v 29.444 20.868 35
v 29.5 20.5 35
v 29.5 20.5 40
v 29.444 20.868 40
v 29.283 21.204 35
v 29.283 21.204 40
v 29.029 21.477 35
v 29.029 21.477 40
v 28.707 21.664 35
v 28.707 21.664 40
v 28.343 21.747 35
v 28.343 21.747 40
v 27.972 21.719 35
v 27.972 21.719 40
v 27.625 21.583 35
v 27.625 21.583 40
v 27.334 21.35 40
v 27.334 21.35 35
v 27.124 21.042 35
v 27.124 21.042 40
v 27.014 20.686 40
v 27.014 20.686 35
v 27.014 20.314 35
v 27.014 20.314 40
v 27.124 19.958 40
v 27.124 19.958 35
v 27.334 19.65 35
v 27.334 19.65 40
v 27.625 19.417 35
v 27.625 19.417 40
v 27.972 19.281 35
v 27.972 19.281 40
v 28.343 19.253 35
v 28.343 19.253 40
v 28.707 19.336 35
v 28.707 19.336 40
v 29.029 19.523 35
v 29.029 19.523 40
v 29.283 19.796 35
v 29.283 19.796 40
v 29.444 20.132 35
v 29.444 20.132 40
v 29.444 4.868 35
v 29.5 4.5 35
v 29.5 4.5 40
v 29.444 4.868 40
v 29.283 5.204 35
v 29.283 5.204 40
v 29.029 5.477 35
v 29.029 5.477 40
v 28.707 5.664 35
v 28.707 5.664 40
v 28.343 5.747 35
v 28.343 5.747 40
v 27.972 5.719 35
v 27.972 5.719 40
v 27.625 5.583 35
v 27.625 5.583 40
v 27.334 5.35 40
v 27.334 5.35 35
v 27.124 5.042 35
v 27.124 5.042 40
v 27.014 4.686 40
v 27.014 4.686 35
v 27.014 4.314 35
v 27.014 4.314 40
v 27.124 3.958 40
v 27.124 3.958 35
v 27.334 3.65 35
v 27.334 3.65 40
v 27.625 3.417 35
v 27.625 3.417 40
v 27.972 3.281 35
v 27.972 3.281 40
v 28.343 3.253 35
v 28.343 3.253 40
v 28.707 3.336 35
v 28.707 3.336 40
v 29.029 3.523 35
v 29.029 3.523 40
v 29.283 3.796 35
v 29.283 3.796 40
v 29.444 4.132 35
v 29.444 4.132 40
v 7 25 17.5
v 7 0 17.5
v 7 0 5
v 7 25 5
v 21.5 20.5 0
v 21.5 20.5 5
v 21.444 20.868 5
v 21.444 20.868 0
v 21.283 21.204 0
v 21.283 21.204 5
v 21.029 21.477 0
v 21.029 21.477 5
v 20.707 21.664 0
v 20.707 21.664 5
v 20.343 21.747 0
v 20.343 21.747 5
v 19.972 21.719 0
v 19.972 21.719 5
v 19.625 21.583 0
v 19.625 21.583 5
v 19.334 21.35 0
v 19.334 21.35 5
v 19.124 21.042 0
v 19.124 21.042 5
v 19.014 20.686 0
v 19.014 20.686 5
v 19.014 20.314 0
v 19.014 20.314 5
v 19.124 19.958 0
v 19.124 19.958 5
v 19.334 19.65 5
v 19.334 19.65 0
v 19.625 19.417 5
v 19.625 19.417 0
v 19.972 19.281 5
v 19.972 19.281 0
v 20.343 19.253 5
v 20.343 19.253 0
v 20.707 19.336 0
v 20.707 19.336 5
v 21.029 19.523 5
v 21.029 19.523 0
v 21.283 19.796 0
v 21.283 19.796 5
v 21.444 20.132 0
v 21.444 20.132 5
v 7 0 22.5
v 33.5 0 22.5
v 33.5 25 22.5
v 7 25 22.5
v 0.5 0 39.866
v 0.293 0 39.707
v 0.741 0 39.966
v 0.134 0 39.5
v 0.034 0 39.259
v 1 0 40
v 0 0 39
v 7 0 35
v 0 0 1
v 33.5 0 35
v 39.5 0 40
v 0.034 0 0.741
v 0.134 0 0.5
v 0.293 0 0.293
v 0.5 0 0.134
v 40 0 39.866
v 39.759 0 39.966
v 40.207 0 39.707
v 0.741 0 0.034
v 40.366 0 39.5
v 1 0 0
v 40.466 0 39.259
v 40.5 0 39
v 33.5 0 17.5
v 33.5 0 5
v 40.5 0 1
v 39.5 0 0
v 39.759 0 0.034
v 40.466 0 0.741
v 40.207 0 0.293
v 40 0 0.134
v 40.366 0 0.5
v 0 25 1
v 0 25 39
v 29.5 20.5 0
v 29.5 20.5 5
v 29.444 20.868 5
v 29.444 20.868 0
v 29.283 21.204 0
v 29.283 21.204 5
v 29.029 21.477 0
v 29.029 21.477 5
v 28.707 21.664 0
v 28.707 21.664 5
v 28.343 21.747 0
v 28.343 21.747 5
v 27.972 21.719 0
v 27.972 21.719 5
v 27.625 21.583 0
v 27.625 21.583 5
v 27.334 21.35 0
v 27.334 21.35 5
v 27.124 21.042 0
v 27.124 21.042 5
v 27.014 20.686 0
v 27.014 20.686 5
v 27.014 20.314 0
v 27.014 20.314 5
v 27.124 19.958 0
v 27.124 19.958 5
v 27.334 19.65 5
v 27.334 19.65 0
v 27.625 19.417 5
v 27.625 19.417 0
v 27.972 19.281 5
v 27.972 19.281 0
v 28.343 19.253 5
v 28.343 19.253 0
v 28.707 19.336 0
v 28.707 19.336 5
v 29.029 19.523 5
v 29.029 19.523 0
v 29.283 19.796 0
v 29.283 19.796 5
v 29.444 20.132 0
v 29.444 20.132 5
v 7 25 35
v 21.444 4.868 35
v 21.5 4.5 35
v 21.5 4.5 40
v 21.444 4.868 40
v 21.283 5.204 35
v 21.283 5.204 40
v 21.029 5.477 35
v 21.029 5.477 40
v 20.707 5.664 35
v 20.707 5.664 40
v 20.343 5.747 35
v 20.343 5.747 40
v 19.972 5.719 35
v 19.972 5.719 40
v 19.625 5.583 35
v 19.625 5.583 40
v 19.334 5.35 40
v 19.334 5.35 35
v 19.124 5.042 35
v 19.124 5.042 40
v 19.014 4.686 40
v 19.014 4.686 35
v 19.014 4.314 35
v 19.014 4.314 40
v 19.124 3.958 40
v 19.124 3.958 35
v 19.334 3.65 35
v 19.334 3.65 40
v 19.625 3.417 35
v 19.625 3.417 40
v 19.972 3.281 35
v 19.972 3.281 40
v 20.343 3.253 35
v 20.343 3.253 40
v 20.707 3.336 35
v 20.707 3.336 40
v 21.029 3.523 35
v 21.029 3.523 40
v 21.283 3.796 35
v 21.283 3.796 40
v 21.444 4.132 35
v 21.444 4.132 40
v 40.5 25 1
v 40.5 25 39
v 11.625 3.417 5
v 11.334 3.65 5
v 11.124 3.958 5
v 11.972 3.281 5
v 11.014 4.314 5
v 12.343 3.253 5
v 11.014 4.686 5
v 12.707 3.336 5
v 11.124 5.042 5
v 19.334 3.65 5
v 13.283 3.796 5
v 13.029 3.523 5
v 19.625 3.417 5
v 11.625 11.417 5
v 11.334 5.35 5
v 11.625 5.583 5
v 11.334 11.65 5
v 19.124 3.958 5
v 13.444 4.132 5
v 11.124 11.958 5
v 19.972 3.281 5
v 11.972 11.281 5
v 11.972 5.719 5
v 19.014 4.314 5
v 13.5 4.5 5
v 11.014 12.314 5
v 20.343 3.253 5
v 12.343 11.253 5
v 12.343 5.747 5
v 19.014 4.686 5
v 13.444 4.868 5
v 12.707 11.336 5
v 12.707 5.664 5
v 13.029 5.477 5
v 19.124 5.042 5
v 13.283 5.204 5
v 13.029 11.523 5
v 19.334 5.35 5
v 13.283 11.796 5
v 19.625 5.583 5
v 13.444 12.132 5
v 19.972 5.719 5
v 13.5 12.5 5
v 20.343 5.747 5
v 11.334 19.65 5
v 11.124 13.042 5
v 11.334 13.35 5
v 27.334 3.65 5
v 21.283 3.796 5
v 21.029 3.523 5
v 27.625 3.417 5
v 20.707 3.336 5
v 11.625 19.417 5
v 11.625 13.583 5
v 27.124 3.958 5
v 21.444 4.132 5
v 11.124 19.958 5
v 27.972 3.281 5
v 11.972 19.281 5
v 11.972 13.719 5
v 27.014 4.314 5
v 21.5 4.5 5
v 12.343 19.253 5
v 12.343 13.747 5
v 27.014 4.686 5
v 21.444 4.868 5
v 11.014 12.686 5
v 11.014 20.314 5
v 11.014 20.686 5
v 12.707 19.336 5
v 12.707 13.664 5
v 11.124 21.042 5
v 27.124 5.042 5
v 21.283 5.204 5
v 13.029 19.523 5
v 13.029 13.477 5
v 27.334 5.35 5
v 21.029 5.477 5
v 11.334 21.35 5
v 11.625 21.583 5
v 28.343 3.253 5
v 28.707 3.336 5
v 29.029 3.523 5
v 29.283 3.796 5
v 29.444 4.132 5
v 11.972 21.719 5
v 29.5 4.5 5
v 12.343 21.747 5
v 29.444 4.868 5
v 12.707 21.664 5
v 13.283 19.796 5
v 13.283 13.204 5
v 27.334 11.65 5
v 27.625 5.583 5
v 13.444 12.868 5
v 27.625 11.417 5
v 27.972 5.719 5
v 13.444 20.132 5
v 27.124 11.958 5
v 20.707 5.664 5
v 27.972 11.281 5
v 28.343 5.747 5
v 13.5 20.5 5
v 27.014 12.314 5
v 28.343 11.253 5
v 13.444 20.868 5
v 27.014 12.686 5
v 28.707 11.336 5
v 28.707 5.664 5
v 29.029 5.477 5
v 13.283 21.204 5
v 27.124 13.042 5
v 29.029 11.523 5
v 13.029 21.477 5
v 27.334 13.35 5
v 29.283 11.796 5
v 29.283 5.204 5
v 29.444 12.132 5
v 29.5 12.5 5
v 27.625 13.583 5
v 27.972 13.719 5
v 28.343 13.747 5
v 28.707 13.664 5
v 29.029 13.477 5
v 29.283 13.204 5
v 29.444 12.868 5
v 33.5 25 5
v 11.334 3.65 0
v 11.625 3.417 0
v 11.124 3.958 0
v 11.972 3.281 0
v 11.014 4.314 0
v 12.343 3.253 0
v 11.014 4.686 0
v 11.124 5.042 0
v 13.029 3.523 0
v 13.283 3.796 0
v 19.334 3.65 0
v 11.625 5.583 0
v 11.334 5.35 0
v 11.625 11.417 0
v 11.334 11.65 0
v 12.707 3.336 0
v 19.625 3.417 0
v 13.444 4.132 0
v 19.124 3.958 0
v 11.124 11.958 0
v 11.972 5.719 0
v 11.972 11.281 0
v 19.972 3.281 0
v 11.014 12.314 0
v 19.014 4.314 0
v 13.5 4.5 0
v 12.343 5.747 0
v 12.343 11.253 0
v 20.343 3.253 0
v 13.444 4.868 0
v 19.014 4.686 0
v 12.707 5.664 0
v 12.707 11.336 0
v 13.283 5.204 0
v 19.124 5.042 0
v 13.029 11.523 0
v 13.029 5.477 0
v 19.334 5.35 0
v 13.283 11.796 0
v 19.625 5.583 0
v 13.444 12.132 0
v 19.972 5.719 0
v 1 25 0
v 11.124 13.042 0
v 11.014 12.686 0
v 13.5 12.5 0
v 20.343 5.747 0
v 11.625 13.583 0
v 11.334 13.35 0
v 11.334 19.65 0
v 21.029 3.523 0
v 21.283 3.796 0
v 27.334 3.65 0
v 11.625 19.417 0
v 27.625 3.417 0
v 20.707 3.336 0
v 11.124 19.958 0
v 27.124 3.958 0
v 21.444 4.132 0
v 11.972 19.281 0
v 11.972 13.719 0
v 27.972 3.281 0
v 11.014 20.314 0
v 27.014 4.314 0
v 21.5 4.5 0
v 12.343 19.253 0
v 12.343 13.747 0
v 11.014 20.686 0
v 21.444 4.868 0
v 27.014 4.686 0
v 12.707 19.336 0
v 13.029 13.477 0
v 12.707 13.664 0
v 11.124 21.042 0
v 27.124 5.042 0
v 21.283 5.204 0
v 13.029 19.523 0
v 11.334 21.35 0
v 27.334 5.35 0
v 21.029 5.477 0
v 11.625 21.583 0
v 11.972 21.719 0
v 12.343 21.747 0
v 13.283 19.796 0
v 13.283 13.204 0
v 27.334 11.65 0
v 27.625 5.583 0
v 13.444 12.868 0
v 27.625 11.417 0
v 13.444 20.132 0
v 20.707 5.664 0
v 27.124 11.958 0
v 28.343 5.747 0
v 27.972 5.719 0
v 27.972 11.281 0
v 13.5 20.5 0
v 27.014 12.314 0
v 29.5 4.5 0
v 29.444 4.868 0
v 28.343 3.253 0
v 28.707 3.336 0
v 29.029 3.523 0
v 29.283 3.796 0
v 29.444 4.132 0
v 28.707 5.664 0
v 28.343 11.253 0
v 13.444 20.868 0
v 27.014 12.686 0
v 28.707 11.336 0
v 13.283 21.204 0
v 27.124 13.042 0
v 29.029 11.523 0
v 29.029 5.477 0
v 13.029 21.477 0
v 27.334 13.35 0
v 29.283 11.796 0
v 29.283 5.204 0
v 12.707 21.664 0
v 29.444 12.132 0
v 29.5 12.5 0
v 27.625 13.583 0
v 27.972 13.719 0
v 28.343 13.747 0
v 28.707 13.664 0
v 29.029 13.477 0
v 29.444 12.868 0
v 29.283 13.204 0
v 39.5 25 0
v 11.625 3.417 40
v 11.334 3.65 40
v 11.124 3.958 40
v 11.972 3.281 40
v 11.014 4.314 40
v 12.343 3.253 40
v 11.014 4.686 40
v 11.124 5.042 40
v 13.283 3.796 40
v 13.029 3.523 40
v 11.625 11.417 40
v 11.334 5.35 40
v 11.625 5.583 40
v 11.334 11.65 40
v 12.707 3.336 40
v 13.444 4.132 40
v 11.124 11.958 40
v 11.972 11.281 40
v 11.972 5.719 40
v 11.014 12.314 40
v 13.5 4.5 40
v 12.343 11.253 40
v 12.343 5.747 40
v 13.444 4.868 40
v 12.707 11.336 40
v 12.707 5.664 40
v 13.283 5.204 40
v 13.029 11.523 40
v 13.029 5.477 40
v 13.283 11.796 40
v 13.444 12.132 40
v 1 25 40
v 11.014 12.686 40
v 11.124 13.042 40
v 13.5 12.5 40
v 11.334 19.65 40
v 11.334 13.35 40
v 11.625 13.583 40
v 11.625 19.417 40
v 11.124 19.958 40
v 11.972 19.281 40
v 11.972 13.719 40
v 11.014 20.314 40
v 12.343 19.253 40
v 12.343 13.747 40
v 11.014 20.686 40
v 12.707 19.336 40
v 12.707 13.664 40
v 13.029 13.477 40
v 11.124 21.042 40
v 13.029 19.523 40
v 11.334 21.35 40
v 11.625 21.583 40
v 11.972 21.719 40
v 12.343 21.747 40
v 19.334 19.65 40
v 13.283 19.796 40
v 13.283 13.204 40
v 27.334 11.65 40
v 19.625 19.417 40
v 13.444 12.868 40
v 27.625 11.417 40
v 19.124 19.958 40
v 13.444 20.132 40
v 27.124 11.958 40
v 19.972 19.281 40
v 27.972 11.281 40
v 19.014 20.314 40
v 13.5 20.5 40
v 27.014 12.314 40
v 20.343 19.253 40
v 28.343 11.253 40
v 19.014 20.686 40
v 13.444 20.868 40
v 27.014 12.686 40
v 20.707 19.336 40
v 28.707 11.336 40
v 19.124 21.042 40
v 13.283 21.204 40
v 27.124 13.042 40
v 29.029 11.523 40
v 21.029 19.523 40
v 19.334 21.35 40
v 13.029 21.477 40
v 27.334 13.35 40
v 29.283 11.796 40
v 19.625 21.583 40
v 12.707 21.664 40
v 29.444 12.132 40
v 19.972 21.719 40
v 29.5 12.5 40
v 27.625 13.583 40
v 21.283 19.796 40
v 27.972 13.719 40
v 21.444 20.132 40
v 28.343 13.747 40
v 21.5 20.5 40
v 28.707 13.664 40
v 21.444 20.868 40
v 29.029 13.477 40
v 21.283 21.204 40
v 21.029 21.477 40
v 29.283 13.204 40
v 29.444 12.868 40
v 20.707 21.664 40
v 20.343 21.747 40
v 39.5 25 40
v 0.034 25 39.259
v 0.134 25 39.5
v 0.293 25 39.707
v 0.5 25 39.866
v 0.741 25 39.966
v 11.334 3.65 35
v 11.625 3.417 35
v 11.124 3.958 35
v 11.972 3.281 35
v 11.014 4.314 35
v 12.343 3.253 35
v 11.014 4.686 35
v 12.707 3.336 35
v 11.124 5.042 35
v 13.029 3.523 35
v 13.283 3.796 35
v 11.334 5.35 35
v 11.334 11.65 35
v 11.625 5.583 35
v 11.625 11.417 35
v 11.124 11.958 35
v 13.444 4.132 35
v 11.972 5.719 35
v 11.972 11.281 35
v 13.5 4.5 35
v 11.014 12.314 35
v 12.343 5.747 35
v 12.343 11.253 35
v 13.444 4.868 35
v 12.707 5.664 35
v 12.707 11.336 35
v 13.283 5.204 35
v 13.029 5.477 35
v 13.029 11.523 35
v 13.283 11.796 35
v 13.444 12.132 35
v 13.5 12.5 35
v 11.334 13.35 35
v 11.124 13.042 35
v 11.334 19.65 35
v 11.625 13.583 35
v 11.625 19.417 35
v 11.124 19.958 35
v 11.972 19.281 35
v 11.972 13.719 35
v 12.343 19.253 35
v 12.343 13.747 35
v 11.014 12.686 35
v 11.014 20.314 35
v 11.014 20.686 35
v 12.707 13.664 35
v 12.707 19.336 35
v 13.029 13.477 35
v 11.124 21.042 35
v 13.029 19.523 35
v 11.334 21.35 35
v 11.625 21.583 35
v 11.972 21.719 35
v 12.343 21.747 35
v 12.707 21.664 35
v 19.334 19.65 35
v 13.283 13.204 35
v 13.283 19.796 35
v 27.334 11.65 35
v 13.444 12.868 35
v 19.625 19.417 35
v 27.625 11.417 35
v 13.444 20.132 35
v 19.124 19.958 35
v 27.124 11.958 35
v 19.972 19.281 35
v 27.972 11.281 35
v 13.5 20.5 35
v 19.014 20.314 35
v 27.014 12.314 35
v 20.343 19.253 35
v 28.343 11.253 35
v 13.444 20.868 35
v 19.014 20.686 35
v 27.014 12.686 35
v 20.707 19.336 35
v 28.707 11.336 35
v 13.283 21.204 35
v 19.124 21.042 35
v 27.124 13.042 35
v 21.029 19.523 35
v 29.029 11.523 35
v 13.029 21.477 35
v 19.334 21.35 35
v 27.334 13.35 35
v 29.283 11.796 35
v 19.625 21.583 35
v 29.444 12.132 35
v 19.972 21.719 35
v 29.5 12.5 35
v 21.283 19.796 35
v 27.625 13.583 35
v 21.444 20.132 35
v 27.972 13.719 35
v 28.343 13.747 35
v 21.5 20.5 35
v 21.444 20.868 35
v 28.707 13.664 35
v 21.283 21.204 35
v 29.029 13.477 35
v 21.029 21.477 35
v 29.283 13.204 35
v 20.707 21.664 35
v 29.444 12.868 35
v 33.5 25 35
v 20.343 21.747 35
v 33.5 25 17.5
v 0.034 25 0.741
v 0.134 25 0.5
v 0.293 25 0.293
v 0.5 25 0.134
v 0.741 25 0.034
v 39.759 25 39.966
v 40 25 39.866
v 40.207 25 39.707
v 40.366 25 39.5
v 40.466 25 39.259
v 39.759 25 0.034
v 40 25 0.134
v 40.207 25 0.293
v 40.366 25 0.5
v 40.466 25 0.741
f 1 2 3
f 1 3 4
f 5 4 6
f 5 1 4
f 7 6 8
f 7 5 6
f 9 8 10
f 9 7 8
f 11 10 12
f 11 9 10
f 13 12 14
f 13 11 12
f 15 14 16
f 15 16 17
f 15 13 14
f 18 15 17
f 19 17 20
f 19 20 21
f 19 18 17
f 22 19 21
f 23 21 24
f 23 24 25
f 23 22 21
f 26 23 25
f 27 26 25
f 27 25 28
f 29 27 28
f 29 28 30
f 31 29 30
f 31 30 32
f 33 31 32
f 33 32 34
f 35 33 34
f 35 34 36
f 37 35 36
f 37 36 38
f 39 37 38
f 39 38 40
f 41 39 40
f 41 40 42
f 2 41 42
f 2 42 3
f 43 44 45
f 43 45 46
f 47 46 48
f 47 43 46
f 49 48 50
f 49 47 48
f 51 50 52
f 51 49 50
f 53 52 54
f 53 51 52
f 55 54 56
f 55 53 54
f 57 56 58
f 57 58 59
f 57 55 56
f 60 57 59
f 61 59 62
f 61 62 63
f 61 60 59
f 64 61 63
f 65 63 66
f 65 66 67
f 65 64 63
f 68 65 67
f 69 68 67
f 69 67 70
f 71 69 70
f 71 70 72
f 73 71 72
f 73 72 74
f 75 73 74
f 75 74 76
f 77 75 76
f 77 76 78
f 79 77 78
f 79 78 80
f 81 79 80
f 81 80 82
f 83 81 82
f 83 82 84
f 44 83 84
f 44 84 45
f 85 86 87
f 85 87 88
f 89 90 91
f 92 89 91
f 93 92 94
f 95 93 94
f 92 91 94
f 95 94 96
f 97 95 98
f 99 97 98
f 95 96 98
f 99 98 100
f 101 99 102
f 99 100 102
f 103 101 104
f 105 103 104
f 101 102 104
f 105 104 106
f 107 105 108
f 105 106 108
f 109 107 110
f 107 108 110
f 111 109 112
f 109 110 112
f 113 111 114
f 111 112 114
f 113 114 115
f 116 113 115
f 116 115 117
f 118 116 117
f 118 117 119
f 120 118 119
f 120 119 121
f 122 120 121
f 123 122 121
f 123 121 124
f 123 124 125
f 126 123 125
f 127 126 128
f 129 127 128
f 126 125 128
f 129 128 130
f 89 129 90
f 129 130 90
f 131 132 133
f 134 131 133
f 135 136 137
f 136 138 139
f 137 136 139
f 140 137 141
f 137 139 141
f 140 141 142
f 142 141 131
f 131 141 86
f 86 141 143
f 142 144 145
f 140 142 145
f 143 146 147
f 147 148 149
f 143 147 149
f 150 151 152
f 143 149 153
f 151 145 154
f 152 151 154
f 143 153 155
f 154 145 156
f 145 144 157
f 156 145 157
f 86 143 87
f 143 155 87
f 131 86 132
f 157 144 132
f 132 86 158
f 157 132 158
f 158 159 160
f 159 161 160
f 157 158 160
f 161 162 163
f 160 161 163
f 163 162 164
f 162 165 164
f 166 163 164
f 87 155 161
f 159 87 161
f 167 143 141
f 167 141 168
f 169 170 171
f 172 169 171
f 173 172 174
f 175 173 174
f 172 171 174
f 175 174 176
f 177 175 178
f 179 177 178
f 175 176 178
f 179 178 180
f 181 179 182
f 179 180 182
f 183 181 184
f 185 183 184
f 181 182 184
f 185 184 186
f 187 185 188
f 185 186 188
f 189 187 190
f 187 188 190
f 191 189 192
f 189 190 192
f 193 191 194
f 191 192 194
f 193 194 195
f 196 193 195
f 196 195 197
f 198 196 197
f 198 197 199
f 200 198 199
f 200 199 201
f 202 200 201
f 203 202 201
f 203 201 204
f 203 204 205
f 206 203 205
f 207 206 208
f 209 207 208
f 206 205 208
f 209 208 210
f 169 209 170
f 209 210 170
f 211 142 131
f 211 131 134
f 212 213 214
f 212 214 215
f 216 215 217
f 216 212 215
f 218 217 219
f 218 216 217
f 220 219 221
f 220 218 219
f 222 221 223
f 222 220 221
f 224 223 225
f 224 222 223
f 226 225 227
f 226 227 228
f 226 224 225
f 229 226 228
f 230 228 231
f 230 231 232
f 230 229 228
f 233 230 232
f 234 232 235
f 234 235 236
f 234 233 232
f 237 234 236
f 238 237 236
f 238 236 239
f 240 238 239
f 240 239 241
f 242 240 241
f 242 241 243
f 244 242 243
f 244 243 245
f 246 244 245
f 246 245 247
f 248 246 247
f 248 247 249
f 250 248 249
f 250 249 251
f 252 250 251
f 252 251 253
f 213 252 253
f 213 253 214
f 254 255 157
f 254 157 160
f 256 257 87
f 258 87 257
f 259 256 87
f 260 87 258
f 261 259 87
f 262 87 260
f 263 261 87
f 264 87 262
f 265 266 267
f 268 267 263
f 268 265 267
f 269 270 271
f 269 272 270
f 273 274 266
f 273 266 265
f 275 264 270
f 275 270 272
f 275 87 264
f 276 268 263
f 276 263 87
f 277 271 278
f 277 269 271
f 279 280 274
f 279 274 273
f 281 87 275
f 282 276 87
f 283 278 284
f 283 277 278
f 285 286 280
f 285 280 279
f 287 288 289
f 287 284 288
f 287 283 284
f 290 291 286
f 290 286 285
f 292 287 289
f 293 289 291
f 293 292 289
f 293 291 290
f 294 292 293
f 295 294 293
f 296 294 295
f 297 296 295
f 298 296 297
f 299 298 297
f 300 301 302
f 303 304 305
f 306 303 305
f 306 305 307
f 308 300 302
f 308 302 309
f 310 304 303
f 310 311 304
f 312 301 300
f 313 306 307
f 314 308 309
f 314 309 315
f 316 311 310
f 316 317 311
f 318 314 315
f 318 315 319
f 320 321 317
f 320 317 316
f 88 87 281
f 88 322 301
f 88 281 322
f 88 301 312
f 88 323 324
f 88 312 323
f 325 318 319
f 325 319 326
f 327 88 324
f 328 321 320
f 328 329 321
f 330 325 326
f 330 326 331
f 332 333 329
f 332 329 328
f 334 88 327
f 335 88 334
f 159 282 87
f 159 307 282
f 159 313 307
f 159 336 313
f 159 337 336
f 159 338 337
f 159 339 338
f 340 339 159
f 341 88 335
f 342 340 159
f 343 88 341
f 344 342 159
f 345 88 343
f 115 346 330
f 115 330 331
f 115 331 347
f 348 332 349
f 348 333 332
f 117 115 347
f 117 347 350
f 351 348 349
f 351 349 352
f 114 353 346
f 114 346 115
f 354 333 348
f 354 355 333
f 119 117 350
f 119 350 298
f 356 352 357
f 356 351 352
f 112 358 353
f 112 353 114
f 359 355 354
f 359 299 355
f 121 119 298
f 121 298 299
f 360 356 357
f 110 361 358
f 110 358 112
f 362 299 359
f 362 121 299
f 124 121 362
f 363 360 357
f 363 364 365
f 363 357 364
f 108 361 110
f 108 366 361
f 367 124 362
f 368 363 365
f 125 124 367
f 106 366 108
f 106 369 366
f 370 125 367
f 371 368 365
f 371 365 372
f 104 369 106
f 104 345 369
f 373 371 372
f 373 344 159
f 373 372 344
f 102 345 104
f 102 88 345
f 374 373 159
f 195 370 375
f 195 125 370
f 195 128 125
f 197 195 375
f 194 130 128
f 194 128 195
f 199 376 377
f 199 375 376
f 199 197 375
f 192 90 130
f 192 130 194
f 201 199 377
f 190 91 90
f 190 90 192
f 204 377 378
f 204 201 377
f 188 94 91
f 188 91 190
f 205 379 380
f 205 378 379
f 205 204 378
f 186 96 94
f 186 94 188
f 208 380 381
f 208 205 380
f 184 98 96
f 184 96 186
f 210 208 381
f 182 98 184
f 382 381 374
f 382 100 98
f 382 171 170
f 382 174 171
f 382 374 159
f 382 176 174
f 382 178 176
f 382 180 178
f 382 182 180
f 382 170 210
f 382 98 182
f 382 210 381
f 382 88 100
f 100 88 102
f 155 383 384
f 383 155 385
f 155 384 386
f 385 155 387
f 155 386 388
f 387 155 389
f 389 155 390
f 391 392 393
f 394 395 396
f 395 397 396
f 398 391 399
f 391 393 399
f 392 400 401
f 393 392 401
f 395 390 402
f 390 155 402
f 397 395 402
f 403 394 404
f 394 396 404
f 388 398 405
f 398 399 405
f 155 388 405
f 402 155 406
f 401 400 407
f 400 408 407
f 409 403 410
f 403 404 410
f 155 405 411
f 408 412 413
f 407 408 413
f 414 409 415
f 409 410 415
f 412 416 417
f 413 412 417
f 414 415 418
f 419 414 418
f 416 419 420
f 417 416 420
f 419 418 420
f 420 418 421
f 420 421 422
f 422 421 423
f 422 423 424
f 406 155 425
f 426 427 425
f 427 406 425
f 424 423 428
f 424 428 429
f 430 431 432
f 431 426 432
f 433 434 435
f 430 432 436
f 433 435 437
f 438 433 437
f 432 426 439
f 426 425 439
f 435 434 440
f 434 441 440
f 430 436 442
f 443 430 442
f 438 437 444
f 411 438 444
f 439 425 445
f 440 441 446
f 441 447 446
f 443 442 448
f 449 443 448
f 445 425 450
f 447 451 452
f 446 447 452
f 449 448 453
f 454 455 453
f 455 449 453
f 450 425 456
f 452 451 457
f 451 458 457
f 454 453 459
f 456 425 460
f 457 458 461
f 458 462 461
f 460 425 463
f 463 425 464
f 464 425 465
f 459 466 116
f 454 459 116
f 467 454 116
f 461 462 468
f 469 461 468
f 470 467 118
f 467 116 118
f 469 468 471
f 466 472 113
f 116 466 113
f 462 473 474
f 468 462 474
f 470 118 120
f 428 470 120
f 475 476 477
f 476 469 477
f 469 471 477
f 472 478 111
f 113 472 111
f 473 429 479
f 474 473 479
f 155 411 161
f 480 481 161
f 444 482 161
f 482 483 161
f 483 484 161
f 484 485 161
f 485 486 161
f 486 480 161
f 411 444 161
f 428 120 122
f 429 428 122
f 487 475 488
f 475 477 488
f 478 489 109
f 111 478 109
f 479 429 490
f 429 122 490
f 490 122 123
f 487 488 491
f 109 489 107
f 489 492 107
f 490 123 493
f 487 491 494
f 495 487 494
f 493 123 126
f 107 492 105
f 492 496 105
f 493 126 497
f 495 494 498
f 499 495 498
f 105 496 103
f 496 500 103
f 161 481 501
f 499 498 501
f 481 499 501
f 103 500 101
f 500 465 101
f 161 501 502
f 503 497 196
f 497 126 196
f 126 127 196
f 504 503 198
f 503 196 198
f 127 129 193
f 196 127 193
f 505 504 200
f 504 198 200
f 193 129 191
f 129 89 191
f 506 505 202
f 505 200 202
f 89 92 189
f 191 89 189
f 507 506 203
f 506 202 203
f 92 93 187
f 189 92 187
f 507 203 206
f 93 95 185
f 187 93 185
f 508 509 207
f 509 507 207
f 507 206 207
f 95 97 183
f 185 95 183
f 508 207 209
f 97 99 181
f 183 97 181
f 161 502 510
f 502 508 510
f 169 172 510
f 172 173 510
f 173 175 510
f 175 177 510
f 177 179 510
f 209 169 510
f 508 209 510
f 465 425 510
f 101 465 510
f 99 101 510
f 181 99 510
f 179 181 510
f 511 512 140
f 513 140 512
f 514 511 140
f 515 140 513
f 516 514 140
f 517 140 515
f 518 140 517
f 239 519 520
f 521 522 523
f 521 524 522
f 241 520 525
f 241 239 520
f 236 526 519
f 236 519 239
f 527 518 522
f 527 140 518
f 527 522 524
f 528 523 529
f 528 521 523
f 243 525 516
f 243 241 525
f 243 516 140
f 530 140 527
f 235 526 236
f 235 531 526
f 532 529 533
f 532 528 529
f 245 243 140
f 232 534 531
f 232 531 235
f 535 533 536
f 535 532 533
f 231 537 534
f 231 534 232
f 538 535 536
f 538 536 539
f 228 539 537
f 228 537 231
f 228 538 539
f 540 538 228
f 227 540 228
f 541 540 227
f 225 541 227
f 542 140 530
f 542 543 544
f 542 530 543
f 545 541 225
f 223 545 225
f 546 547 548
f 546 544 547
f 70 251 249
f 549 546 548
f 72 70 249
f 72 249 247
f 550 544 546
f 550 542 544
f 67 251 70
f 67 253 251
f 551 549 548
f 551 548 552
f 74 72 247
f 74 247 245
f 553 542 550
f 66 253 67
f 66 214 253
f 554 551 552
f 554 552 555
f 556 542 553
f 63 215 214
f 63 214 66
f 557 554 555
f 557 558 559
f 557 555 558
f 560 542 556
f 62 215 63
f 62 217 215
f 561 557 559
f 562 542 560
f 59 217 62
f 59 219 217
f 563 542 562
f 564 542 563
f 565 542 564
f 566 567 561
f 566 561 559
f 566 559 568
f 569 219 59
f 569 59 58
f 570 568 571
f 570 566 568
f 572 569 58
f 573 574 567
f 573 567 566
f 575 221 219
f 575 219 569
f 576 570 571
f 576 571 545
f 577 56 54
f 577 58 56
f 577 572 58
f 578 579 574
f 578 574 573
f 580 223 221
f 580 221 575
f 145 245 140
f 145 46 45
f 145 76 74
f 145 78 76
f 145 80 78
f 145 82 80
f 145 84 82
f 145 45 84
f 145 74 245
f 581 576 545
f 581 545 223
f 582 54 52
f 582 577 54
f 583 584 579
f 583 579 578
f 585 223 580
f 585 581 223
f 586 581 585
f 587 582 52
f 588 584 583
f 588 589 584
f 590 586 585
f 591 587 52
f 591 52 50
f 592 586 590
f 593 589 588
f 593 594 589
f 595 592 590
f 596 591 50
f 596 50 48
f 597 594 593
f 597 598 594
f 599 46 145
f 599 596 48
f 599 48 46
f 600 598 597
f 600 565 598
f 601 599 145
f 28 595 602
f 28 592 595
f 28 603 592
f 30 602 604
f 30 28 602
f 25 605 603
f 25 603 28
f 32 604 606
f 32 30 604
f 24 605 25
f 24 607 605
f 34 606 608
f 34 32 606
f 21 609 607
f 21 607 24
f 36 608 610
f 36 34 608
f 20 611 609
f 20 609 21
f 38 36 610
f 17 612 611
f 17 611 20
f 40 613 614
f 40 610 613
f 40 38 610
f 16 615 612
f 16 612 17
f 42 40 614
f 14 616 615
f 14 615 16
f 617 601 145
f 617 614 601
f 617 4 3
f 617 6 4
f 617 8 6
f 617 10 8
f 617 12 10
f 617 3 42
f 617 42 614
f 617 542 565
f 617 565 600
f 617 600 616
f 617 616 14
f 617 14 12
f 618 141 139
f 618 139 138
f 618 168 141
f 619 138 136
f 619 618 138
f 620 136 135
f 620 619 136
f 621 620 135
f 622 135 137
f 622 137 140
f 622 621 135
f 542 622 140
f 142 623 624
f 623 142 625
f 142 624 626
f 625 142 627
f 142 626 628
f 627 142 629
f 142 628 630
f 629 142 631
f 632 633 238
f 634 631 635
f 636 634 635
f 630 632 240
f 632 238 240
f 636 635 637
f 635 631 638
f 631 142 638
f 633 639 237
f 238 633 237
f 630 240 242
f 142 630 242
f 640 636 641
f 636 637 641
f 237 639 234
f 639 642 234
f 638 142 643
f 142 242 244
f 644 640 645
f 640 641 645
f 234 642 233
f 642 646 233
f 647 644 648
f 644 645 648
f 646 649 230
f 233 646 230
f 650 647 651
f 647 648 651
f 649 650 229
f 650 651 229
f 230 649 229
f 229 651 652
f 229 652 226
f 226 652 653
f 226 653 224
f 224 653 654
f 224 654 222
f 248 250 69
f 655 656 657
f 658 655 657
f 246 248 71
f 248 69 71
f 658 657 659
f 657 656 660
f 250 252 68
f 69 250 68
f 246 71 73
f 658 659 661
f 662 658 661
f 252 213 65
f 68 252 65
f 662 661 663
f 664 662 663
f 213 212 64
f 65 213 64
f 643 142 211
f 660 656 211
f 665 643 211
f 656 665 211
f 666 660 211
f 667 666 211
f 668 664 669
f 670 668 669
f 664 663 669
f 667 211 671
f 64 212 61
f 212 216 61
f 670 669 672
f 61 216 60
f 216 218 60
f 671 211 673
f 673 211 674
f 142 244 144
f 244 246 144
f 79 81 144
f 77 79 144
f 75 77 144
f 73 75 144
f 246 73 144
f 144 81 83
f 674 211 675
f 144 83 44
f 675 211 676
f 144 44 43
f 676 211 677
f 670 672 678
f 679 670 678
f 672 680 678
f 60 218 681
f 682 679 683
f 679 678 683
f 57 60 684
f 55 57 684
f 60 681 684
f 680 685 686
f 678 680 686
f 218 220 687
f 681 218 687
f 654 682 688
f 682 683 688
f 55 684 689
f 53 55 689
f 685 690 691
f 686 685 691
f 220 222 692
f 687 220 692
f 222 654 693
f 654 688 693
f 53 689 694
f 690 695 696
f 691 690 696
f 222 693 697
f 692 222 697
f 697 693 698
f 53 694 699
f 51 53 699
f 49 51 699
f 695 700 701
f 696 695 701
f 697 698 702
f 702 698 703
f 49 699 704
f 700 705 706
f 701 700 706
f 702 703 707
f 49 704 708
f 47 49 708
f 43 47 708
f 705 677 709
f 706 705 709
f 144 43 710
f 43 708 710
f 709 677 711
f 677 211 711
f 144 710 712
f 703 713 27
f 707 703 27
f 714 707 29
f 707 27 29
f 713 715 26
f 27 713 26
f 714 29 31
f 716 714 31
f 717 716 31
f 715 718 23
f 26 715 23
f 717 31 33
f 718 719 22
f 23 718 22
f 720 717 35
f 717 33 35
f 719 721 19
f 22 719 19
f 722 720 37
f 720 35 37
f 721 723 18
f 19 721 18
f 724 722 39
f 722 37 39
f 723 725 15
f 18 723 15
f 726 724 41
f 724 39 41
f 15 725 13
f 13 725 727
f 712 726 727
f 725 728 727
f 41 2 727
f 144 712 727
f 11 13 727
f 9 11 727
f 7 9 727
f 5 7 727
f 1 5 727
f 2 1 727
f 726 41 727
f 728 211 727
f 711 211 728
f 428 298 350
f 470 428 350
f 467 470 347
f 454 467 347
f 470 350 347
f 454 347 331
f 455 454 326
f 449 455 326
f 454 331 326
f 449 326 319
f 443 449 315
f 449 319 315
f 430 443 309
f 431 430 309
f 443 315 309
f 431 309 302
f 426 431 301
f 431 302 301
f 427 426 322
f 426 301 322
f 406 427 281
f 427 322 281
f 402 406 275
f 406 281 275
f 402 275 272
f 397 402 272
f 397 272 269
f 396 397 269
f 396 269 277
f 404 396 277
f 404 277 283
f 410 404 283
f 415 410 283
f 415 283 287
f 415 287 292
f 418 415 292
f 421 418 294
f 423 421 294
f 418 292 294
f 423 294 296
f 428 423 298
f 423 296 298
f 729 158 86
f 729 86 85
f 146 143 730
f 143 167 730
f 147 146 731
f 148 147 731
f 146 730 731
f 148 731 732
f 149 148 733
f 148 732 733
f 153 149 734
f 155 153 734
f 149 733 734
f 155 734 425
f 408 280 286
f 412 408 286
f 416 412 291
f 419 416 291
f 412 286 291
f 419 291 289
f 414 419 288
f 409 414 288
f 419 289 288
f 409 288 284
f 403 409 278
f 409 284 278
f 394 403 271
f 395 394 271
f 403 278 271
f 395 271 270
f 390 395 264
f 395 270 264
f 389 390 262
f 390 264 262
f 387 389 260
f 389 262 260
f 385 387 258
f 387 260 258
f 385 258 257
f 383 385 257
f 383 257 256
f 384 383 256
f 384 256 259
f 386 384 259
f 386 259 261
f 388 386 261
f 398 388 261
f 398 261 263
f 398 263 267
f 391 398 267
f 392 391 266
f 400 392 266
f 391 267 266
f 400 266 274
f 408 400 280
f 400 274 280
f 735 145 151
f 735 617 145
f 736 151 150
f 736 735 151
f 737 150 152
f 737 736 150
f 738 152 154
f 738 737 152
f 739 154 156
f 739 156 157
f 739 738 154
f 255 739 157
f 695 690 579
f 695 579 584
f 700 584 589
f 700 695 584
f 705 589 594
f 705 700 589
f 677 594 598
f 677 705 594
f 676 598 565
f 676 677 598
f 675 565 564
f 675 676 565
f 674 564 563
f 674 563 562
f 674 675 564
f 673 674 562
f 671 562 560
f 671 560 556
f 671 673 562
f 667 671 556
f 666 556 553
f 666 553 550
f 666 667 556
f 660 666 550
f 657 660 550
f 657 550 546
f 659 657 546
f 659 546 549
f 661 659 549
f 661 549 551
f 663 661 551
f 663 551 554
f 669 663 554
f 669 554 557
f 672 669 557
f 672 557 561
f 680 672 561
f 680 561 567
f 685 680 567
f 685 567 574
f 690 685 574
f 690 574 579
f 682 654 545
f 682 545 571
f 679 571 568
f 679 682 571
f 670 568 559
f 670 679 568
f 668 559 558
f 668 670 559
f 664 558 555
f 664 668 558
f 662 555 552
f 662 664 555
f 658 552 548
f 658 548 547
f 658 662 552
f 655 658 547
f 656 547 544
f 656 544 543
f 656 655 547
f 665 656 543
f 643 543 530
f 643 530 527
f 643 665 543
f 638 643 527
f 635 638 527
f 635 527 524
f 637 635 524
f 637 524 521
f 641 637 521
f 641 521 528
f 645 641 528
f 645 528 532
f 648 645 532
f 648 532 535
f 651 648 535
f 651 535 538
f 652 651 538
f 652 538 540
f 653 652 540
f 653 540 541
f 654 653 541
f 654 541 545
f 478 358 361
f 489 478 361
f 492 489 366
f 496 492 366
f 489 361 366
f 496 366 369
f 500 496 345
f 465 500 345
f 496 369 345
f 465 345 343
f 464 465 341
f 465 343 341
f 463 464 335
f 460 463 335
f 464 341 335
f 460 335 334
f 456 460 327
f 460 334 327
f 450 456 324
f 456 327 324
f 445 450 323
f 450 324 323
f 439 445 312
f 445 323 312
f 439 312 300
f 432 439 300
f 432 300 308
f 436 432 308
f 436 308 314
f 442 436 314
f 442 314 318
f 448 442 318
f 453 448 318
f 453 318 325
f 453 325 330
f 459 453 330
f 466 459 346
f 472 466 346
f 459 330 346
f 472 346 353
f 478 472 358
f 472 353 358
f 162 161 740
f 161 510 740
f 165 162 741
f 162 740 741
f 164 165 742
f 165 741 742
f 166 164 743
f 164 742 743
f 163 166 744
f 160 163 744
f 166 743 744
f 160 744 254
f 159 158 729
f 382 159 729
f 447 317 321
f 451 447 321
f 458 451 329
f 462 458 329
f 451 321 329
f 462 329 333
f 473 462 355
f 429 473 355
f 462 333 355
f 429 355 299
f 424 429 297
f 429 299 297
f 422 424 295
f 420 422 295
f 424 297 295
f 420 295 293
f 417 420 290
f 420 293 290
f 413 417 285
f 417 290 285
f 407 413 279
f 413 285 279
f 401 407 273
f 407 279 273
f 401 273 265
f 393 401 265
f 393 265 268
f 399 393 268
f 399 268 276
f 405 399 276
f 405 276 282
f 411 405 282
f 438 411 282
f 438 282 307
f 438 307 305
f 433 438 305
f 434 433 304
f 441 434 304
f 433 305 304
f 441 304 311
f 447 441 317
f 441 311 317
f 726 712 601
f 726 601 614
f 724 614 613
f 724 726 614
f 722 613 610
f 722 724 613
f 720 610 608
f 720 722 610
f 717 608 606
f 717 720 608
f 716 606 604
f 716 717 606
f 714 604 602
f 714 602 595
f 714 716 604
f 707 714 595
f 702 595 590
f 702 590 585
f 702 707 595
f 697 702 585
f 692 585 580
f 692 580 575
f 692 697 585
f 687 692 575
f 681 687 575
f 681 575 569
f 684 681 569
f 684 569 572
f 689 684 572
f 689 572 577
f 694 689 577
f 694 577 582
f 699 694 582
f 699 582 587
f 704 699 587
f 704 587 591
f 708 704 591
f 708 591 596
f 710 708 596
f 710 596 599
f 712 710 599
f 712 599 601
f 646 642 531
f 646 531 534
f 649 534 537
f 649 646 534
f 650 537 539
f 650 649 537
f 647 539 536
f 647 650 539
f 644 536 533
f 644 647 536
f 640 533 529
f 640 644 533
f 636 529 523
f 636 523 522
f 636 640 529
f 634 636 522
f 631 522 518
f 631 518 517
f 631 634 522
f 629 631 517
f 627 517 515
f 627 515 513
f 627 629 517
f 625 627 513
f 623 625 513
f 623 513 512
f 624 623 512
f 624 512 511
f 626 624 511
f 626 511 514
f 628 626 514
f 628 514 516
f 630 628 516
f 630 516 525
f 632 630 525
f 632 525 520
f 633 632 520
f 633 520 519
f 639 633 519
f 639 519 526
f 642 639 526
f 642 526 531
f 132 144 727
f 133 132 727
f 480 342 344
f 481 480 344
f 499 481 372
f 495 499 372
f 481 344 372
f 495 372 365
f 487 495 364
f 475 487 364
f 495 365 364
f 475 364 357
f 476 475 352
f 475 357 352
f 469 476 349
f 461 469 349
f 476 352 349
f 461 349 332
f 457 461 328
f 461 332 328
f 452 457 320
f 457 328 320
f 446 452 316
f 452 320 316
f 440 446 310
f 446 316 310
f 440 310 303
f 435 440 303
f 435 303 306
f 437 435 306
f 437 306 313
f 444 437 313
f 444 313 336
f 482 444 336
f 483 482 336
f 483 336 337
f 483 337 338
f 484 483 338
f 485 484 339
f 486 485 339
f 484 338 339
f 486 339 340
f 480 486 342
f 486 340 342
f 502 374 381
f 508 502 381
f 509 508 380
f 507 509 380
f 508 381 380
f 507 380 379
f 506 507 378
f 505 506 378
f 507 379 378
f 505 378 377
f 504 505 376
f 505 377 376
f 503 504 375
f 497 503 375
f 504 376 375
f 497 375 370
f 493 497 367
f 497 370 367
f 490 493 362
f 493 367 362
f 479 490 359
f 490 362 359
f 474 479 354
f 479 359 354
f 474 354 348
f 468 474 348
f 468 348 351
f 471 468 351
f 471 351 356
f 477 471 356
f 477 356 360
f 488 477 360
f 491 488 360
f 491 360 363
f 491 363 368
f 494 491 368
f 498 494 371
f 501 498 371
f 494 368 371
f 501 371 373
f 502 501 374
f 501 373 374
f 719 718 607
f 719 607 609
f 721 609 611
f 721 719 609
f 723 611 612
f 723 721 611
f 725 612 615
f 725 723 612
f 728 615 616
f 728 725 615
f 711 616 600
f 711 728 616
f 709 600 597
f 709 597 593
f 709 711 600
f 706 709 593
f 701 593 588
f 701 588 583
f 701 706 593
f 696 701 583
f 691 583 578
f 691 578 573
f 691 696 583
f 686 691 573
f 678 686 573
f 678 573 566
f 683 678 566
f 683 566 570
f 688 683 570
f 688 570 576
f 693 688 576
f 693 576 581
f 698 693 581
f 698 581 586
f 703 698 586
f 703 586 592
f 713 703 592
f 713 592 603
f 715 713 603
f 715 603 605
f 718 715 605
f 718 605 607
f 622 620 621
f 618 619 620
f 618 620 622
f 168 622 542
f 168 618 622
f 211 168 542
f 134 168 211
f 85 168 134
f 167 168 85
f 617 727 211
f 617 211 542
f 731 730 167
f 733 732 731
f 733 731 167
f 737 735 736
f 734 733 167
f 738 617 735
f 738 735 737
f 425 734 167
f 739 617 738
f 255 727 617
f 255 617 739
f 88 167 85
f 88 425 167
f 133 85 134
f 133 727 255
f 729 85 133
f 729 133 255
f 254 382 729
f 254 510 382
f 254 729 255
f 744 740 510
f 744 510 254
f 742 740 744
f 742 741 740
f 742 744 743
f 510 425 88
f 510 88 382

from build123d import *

# Parameters (mm, degrees)
SKETCH1_W               = 40.5
SKETCH1_H               = 25
BOSS_EXTRUDE1_DEPTH     = 40
CUT_EXTRUDE1_START      = -5
SKETCH2_W               = 26.5
SKETCH2_H               = 25
CUT_EXTRUDE1_DEPTH      = 30
FILLET1_R               = 1
SKETCH3_R               = 1.25
CUT_EXTRUDE2_DEPTH      = 35
CUT_EXTRUDE2_DEPTH_BACK = 5
FILLET2_R               = 1
SKETCH6_W               = 5
SKETCH6_H               = 25
BOSS_EXTRUDE3_DEPTH     = 40.5


with BuildPart() as part:
    # Sketch1 → Boss-Extrude1 (new body)
    with BuildSketch(Plane.XY):
        with Locations((20.25, 12.5)):
            Rectangle(SKETCH1_W, SKETCH1_H)
    extrude(amount=BOSS_EXTRUDE1_DEPTH)

    # Sketch2 → Cut-Extrude1 (cut)
    with BuildSketch(Plane.XY.offset(40).offset(CUT_EXTRUDE1_START)):
        with Locations((20.25, 12.5)):
            Rectangle(SKETCH2_W, SKETCH2_H)
    extrude(amount=-CUT_EXTRUDE1_DEPTH, mode=Mode.SUBTRACT)

    # Fillet1
    fillet1_edges = [part.edges().sort_by_distance(p)[0] for p in [
        (40.5, 12.5, 0),
        (0, 12.5, 0),
    ]]
    fillet(fillet1_edges, radius=FILLET1_R)

    # Sketch3 → Cut-Extrude2 (cut, two sides)
    with BuildSketch(Plane.XY.offset(5)) as cut_extrude2_sk:
        with Locations((12.25, 4.5)):
            Circle(SKETCH3_R)
        with Locations((20.25, 4.5)):
            Circle(SKETCH3_R)
        with Locations((12.25, 12.5)):
            Circle(SKETCH3_R)
        with Locations((12.25, 20.5)):
            Circle(SKETCH3_R)
        with Locations((20.25, 20.5)):
            Circle(SKETCH3_R)
        with Locations((28.25, 4.5)):
            Circle(SKETCH3_R)
        with Locations((28.25, 12.5)):
            Circle(SKETCH3_R)
        with Locations((28.25, 20.5)):
            Circle(SKETCH3_R)
    extrude(amount=CUT_EXTRUDE2_DEPTH, mode=Mode.SUBTRACT)
    extrude(cut_extrude2_sk.sketch, amount=-CUT_EXTRUDE2_DEPTH_BACK, mode=Mode.SUBTRACT)

    # Fillet2
    fillet2_edges = [part.edges().sort_by_distance(p)[0] for p in [
        (40.5, 12.5, 40),
        (0, 12.5, 40),
    ]]
    fillet(fillet2_edges, radius=FILLET2_R)

    # Sketch6 → Boss-Extrude3 (add)
    with BuildSketch(Plane(origin=(40.5, 0, 0), x_dir=(0, 0, -1), z_dir=(1, 0, 0))):
        with Locations((-20, 12.5)):
            Rectangle(SKETCH6_W, SKETCH6_H)
    extrude(amount=-BOSS_EXTRUDE3_DEPTH)


solid = part.part
